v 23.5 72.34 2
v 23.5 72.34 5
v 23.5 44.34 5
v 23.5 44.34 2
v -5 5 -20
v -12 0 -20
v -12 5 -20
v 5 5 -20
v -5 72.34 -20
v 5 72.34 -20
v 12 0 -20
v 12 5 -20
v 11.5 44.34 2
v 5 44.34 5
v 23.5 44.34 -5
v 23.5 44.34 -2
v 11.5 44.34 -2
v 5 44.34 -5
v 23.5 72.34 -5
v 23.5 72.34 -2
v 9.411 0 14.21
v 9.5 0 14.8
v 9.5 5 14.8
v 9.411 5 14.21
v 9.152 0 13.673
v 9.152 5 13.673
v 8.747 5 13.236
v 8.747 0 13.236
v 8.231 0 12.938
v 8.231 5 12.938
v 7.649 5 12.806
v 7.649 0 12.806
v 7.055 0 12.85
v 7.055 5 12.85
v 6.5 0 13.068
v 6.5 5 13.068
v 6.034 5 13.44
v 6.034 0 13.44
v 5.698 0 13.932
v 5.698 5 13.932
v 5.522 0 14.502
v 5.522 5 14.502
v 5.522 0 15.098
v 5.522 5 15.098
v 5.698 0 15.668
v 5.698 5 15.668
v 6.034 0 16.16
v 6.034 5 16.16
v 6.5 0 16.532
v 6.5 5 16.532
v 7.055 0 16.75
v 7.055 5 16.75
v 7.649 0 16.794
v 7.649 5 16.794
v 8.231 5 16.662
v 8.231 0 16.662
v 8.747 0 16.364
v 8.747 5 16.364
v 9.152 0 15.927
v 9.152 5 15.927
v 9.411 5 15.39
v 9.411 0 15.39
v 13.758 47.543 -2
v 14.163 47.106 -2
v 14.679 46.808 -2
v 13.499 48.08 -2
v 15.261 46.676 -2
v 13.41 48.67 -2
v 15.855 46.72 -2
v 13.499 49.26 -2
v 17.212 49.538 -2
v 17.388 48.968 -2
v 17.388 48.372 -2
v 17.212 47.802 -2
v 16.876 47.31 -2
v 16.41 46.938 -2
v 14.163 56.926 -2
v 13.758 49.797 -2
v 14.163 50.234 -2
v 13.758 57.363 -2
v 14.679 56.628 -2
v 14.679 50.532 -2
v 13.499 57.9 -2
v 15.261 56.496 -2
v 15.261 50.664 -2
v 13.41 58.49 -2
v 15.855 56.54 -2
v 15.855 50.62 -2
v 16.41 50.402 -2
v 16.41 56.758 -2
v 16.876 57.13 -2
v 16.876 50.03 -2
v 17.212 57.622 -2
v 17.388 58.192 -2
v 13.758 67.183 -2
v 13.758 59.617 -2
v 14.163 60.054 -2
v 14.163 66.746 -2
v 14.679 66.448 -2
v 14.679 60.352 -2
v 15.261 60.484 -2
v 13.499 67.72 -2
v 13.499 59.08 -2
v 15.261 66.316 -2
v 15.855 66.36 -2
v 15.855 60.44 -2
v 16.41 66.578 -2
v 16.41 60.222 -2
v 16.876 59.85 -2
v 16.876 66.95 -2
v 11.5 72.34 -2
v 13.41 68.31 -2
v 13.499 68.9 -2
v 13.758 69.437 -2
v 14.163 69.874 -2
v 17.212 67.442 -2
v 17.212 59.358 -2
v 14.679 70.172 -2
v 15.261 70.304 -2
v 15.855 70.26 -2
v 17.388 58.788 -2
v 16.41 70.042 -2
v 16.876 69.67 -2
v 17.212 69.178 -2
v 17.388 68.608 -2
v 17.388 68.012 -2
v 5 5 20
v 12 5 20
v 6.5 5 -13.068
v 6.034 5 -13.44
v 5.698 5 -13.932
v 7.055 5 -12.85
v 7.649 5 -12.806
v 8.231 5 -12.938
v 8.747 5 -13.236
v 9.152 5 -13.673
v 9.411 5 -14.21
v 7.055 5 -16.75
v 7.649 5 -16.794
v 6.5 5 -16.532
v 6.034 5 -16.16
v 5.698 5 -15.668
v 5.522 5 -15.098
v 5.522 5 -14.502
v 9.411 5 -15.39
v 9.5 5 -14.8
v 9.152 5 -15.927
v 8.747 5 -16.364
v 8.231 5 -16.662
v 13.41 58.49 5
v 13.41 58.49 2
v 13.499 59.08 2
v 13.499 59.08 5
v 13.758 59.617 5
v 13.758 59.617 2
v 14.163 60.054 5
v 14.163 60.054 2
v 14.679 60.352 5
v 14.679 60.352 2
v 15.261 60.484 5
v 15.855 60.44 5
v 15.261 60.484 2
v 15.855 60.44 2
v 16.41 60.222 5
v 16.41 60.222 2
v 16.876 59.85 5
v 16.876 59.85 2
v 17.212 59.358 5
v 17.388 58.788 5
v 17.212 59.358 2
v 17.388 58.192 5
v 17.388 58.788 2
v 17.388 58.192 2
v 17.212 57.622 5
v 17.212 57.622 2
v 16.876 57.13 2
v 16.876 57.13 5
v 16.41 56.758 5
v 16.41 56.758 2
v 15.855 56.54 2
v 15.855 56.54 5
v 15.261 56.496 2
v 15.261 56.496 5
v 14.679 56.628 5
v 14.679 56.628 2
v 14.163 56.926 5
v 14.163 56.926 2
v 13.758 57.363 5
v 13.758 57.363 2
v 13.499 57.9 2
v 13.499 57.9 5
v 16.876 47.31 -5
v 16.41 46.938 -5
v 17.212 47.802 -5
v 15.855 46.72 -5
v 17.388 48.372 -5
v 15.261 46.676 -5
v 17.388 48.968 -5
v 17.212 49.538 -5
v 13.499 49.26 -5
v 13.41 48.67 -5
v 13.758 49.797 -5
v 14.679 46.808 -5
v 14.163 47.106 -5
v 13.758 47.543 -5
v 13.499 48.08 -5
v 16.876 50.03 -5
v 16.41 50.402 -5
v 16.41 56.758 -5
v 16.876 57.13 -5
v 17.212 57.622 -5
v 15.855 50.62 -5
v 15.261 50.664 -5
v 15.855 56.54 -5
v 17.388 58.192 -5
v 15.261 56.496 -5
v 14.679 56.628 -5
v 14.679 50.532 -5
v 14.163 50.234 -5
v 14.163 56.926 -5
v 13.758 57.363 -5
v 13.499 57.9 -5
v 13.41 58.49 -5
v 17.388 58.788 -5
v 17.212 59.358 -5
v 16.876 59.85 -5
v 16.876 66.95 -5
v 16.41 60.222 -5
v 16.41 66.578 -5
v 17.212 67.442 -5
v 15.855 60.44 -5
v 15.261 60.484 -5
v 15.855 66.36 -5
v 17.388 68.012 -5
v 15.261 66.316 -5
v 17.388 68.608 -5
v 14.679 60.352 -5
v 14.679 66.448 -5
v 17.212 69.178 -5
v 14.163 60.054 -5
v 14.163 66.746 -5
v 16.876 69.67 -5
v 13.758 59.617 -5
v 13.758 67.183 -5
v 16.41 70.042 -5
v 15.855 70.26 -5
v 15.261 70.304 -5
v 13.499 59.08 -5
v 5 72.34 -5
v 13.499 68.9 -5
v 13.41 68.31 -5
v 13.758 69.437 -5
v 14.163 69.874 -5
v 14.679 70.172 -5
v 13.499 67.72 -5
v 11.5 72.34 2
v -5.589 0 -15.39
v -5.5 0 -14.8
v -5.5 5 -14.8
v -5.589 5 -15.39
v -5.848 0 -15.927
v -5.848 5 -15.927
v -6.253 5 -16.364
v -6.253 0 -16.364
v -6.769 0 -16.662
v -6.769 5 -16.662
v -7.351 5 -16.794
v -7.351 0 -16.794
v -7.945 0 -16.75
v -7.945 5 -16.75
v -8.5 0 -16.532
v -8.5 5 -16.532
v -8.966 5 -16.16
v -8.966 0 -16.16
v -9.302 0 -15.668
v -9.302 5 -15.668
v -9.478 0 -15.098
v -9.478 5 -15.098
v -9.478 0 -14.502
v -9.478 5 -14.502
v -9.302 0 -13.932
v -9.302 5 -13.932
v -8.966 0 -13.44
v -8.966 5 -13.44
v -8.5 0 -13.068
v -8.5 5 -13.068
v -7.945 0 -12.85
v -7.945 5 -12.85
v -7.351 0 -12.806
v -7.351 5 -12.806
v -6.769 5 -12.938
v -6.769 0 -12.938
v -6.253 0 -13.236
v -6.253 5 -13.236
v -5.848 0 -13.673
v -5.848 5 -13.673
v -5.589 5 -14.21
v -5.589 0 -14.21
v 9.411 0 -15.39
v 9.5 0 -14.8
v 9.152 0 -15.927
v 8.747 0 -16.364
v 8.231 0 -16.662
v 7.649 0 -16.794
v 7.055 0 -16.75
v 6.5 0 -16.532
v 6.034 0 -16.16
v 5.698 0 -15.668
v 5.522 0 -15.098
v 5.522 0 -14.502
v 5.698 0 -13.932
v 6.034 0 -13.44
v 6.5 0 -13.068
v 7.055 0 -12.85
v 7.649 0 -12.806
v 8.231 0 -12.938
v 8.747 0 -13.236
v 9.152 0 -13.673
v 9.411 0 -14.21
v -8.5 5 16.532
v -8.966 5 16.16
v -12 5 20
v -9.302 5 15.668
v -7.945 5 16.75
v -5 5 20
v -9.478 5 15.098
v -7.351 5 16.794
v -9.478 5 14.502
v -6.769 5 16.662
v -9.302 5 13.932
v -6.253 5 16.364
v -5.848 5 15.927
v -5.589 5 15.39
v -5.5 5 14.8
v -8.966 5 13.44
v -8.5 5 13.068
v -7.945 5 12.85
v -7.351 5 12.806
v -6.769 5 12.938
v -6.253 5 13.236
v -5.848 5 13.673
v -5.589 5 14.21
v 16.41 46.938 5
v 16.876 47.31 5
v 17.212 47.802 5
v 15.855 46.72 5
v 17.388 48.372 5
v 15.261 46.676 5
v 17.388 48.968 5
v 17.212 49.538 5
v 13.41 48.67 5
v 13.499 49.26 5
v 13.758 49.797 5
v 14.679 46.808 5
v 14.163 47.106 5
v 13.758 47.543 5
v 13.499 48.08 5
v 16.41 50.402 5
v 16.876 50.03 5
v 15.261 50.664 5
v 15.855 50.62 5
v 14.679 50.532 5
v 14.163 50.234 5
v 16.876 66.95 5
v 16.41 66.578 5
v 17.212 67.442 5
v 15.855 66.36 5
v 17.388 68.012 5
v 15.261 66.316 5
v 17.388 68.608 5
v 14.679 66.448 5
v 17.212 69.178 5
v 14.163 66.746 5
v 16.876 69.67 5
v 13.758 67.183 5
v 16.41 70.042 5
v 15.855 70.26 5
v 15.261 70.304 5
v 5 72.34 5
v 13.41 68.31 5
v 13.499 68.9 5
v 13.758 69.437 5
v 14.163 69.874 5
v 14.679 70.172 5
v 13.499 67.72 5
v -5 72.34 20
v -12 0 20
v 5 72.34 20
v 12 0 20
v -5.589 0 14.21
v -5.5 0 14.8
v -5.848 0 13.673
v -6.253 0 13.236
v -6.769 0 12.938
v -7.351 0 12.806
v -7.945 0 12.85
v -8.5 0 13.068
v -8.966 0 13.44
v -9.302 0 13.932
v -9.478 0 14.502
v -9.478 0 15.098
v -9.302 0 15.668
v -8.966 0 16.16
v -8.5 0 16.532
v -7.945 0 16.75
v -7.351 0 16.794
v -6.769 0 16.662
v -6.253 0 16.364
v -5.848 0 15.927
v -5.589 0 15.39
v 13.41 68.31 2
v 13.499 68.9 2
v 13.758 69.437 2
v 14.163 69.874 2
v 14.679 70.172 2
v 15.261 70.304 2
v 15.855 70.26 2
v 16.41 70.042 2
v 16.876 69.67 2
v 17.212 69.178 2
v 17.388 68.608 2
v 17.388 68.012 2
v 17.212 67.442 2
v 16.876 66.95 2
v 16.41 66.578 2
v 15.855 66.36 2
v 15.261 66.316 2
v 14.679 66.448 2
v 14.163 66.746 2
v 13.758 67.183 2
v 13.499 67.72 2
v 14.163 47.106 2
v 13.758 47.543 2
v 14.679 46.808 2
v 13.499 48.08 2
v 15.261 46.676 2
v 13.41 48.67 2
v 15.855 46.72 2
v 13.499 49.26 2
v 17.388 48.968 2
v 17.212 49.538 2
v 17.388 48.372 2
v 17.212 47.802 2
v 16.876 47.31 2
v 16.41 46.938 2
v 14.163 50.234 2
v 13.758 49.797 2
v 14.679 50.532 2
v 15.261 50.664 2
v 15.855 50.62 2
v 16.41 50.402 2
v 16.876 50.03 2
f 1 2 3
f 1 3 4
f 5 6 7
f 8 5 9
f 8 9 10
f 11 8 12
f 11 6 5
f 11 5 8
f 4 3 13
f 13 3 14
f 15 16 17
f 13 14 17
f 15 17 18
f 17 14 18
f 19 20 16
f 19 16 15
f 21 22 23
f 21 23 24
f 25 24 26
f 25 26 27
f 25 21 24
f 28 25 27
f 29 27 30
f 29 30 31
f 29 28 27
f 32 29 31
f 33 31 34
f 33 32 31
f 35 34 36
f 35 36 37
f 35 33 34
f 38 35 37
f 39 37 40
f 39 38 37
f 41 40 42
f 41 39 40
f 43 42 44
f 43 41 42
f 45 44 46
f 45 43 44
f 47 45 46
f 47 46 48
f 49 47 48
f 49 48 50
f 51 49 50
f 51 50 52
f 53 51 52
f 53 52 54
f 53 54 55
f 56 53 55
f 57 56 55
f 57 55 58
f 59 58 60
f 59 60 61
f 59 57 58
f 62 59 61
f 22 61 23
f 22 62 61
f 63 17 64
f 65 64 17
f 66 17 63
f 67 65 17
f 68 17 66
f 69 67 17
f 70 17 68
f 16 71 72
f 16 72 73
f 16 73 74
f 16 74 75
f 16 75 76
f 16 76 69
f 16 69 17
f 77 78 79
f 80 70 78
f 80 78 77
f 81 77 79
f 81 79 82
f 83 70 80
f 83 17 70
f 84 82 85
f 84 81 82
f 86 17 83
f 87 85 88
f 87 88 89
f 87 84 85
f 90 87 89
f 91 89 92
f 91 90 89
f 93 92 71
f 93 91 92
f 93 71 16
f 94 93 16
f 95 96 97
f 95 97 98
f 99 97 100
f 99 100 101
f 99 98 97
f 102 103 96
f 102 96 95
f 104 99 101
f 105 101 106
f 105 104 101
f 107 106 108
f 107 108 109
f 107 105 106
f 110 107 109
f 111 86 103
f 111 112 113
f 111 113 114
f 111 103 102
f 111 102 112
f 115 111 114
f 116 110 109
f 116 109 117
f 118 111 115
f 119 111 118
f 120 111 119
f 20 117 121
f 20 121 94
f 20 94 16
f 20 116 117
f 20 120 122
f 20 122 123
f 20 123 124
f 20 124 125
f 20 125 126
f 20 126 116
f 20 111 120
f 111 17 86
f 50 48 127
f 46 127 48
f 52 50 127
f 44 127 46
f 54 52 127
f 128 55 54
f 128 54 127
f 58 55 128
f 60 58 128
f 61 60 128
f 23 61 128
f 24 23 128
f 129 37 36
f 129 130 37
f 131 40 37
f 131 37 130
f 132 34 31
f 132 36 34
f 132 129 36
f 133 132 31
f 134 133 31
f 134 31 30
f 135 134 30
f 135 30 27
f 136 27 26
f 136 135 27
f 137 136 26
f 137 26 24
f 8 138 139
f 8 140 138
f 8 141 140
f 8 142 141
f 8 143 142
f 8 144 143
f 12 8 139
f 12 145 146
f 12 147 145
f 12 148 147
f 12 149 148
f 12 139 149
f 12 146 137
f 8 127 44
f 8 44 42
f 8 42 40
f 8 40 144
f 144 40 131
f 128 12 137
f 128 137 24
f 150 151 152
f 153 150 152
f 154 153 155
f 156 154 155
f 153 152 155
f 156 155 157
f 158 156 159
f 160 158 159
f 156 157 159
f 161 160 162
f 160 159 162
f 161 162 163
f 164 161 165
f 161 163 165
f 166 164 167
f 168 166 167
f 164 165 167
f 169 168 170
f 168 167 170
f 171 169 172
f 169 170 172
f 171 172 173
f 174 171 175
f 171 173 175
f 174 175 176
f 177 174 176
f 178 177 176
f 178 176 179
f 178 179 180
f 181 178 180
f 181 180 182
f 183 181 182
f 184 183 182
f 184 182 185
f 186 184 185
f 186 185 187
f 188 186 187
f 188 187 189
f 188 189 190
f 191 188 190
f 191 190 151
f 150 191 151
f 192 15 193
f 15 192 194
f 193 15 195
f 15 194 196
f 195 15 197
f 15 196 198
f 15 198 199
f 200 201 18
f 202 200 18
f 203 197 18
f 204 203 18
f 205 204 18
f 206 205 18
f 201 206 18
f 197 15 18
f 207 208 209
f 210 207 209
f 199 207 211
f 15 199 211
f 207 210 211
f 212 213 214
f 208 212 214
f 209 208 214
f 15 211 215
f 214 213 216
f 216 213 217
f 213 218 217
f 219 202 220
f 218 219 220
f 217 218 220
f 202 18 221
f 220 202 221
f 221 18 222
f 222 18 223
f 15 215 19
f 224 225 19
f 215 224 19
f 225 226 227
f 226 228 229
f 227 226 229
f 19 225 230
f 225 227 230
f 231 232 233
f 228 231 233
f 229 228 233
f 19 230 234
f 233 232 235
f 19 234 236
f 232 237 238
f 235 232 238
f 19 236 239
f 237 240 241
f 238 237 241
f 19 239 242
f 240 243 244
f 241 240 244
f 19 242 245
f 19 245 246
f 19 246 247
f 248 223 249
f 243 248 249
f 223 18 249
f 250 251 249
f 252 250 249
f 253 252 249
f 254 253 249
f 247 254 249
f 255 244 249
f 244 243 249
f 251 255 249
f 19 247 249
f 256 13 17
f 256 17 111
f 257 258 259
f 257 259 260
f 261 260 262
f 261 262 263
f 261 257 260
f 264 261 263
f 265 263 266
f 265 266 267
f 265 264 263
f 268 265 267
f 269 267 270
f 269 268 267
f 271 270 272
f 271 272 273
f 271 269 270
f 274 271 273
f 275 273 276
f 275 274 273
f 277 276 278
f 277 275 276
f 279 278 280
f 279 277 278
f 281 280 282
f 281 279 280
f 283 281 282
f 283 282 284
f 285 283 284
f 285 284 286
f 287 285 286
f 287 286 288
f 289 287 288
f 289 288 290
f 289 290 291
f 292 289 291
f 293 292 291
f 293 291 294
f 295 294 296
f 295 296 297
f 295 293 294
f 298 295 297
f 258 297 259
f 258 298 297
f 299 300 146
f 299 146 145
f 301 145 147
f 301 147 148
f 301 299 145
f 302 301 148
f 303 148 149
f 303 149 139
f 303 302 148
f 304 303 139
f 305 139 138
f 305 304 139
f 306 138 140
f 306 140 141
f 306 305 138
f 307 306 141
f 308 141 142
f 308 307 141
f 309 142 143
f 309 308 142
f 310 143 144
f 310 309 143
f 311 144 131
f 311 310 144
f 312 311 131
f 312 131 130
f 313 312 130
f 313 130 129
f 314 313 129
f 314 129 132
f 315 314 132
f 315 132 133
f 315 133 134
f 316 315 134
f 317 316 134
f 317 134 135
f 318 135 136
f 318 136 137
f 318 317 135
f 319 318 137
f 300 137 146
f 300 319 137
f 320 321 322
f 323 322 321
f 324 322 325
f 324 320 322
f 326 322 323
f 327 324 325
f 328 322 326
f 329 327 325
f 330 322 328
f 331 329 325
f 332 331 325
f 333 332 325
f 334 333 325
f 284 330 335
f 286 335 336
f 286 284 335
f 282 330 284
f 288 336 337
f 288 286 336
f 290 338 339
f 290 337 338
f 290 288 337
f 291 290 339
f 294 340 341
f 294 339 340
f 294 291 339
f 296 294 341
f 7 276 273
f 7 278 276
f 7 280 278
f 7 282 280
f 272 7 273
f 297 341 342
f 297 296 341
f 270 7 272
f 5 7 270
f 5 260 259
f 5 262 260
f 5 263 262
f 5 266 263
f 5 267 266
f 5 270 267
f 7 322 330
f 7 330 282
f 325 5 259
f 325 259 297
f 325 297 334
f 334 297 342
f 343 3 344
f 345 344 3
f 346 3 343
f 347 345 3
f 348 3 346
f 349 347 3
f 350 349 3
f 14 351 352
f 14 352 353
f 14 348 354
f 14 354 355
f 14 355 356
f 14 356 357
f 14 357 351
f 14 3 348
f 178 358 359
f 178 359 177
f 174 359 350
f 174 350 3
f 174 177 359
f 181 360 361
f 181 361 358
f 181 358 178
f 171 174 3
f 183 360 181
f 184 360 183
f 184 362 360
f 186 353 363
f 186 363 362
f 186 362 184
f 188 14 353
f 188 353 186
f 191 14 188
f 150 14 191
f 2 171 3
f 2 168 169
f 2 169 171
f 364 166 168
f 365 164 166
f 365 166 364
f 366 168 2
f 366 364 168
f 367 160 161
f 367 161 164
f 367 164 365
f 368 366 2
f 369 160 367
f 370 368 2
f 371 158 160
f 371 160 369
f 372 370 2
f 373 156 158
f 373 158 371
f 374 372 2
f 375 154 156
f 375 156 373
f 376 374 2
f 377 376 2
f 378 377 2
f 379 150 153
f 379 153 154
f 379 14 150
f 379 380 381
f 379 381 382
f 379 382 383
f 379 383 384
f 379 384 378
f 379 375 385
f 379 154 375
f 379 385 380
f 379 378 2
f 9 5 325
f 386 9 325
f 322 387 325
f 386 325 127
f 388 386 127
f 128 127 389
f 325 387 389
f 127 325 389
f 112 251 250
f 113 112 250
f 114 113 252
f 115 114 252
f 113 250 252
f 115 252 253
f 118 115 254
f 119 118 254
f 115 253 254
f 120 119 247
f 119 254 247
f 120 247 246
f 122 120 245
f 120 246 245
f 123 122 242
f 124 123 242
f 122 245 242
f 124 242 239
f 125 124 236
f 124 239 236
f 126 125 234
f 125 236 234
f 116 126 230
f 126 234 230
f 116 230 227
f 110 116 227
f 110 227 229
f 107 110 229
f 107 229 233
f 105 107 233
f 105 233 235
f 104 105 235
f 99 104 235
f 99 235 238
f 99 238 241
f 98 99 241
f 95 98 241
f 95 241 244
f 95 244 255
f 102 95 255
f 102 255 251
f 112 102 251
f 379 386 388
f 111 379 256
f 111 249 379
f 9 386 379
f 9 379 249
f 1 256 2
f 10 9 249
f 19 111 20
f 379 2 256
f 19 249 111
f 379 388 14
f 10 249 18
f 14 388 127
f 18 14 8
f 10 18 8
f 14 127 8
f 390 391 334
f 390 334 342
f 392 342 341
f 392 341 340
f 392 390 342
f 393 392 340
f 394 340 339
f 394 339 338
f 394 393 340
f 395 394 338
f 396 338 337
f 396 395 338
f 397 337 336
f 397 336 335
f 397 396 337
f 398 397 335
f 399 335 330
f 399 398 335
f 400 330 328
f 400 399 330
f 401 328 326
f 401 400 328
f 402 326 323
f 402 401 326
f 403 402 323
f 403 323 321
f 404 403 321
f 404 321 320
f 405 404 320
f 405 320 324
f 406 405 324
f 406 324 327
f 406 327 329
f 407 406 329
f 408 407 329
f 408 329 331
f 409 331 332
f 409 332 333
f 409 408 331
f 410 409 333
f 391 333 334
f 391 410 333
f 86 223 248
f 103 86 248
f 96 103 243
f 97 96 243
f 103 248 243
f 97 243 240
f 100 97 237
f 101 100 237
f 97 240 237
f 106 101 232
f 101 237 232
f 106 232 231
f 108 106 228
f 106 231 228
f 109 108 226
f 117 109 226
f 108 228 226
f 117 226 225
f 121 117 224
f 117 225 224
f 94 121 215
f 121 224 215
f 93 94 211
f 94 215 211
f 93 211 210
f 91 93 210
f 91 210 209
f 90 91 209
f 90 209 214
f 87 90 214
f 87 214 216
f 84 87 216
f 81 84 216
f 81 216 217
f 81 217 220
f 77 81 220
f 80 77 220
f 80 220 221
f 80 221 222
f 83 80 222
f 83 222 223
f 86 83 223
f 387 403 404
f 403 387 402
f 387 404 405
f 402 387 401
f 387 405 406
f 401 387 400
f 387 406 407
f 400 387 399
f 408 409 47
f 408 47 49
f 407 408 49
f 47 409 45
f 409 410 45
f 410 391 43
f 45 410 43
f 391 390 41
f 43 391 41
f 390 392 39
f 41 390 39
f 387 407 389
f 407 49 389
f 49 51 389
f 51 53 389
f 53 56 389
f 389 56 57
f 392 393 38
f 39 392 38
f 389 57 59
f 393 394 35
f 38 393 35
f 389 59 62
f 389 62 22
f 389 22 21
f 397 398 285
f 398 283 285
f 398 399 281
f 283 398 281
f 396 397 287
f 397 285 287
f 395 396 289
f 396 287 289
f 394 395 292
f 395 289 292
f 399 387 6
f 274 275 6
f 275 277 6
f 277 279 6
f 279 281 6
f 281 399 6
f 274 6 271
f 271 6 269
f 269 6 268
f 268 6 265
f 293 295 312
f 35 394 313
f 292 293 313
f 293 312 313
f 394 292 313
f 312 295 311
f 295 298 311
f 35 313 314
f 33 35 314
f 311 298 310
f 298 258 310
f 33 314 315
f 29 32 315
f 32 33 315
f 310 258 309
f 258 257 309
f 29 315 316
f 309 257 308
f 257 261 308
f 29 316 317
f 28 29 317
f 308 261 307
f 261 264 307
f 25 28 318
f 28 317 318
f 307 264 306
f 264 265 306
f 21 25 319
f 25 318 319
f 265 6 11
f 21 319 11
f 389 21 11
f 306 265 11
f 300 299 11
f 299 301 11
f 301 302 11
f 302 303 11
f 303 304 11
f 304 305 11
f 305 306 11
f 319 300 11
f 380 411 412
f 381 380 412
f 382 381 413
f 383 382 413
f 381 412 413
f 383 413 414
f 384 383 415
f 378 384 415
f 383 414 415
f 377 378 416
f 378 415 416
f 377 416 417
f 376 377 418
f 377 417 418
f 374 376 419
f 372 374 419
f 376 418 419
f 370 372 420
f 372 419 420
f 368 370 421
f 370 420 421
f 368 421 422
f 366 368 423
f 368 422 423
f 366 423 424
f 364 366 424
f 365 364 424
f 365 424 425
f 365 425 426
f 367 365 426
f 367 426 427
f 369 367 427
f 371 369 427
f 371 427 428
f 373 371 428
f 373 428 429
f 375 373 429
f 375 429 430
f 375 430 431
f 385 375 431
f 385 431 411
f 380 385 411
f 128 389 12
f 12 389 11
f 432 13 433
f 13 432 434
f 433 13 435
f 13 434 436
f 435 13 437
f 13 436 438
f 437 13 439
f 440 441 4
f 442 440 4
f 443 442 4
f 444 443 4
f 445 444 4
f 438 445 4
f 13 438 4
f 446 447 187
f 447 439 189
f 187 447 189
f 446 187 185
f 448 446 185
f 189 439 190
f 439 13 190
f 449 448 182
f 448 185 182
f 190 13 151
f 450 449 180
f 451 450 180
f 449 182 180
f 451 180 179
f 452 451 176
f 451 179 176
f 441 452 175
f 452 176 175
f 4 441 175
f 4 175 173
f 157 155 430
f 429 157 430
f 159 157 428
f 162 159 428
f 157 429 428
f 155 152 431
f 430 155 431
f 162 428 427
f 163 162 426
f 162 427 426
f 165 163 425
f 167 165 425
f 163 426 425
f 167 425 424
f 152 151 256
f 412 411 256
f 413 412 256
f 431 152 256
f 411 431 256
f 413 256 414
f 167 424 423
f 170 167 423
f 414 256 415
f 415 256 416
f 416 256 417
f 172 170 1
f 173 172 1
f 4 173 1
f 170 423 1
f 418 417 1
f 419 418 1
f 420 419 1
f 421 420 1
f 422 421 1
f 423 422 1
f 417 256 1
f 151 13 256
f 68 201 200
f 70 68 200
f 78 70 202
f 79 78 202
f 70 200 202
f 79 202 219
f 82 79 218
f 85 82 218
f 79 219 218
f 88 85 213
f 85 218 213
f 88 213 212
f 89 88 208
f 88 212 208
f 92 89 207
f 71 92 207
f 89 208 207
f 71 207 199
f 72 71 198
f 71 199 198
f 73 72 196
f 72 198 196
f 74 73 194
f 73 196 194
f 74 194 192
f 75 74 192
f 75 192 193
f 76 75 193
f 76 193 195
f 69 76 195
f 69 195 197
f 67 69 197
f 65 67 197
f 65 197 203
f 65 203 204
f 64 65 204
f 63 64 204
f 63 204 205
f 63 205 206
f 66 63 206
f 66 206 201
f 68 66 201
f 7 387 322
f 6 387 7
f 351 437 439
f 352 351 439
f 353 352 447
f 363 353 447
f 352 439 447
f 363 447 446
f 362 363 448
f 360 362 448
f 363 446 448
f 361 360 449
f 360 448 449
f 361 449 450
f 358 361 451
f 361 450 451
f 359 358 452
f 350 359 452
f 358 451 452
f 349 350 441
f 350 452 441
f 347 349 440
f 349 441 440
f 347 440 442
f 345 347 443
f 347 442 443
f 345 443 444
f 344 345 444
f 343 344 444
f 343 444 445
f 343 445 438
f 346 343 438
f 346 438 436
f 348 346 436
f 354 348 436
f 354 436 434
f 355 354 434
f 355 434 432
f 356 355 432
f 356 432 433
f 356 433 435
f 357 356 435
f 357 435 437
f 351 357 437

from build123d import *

# Parameters (mm, degrees)
SKETCH_1_W          = 24
SKETCH_1_H          = 40
SKETCH_1_R          = 2
EXTRUDE_1_DEPTH     = 5
EXTRUDE_5_DEPTH     = 67.34
SKETCH_10_W         = 10
SKETCH_10_H         = 28
EXTRUDE_6_DEPTH     = 18.5
SKETCH_12_R         = 2
CUT_EXTRUDE_4_DEPTH = 24.5
SKETCH_13_W         = 12
SKETCH_13_H         = 28
CUT_EXTRUDE_5_DEPTH = 2


with BuildPart() as part:
    # 草图1 → 凸台-拉伸1 (new body)
    with BuildSketch(Plane(origin=(0, 0, 0), x_dir=(1, 0, 0), z_dir=(0, 1, 0))):
        Rectangle(SKETCH_1_W, SKETCH_1_H)
        with Locations((7.5, -14.8)):
            Circle(SKETCH_1_R, mode=Mode.SUBTRACT)
        with Locations((-7.5, -14.8)):
            Circle(SKETCH_1_R, mode=Mode.SUBTRACT)
        with Locations((-7.5, 14.8)):
            Circle(SKETCH_1_R, mode=Mode.SUBTRACT)
        with Locations((7.5, 14.8)):
            Circle(SKETCH_1_R, mode=Mode.SUBTRACT)
    extrude(amount=EXTRUDE_1_DEPTH)

    # 草图8 → 凸台-拉伸5 (add)
    with BuildSketch(Plane(origin=(0, 5, 0), x_dir=(1, 0, 0), z_dir=(0, 1, 0))):
        Polygon((-5, 0), (-5, -20), (5, -20), (5, 20), (-5, 20), align=None)
    extrude(amount=EXTRUDE_5_DEPTH)

    # 草图10 → 凸台-拉伸6 (add)
    with BuildSketch(Plane(origin=(5, 0, 0), x_dir=(0, 0, -1), z_dir=(1, 0, 0))):
        with Locations((0, 58.34)):
            Rectangle(SKETCH_10_W, SKETCH_10_H)
    extrude(amount=EXTRUDE_6_DEPTH)

    # 草图12 → 切除-拉伸4 (cut)
    with BuildSketch(Plane(origin=(0, 0, -5), x_dir=(-1, 0, 0), z_dir=(0, 0, -1))):
        with Locations((-15.41, 68.31)):
            Circle(SKETCH_12_R)
        with Locations((-15.41, 58.49)):
            Circle(SKETCH_12_R)
        with Locations((-15.41, 48.67)):
            Circle(SKETCH_12_R)
    extrude(amount=-CUT_EXTRUDE_4_DEPTH, mode=Mode.SUBTRACT)

    # 草图13 → 切除-拉伸5 (cut, symmetric)
    with BuildSketch(Plane.XY):
        with Locations((17.5, 58.34)):
            Rectangle(SKETCH_13_W, SKETCH_13_H)
    extrude(amount=CUT_EXTRUDE_5_DEPTH, both=True, mode=Mode.SUBTRACT)


solid = part.part
